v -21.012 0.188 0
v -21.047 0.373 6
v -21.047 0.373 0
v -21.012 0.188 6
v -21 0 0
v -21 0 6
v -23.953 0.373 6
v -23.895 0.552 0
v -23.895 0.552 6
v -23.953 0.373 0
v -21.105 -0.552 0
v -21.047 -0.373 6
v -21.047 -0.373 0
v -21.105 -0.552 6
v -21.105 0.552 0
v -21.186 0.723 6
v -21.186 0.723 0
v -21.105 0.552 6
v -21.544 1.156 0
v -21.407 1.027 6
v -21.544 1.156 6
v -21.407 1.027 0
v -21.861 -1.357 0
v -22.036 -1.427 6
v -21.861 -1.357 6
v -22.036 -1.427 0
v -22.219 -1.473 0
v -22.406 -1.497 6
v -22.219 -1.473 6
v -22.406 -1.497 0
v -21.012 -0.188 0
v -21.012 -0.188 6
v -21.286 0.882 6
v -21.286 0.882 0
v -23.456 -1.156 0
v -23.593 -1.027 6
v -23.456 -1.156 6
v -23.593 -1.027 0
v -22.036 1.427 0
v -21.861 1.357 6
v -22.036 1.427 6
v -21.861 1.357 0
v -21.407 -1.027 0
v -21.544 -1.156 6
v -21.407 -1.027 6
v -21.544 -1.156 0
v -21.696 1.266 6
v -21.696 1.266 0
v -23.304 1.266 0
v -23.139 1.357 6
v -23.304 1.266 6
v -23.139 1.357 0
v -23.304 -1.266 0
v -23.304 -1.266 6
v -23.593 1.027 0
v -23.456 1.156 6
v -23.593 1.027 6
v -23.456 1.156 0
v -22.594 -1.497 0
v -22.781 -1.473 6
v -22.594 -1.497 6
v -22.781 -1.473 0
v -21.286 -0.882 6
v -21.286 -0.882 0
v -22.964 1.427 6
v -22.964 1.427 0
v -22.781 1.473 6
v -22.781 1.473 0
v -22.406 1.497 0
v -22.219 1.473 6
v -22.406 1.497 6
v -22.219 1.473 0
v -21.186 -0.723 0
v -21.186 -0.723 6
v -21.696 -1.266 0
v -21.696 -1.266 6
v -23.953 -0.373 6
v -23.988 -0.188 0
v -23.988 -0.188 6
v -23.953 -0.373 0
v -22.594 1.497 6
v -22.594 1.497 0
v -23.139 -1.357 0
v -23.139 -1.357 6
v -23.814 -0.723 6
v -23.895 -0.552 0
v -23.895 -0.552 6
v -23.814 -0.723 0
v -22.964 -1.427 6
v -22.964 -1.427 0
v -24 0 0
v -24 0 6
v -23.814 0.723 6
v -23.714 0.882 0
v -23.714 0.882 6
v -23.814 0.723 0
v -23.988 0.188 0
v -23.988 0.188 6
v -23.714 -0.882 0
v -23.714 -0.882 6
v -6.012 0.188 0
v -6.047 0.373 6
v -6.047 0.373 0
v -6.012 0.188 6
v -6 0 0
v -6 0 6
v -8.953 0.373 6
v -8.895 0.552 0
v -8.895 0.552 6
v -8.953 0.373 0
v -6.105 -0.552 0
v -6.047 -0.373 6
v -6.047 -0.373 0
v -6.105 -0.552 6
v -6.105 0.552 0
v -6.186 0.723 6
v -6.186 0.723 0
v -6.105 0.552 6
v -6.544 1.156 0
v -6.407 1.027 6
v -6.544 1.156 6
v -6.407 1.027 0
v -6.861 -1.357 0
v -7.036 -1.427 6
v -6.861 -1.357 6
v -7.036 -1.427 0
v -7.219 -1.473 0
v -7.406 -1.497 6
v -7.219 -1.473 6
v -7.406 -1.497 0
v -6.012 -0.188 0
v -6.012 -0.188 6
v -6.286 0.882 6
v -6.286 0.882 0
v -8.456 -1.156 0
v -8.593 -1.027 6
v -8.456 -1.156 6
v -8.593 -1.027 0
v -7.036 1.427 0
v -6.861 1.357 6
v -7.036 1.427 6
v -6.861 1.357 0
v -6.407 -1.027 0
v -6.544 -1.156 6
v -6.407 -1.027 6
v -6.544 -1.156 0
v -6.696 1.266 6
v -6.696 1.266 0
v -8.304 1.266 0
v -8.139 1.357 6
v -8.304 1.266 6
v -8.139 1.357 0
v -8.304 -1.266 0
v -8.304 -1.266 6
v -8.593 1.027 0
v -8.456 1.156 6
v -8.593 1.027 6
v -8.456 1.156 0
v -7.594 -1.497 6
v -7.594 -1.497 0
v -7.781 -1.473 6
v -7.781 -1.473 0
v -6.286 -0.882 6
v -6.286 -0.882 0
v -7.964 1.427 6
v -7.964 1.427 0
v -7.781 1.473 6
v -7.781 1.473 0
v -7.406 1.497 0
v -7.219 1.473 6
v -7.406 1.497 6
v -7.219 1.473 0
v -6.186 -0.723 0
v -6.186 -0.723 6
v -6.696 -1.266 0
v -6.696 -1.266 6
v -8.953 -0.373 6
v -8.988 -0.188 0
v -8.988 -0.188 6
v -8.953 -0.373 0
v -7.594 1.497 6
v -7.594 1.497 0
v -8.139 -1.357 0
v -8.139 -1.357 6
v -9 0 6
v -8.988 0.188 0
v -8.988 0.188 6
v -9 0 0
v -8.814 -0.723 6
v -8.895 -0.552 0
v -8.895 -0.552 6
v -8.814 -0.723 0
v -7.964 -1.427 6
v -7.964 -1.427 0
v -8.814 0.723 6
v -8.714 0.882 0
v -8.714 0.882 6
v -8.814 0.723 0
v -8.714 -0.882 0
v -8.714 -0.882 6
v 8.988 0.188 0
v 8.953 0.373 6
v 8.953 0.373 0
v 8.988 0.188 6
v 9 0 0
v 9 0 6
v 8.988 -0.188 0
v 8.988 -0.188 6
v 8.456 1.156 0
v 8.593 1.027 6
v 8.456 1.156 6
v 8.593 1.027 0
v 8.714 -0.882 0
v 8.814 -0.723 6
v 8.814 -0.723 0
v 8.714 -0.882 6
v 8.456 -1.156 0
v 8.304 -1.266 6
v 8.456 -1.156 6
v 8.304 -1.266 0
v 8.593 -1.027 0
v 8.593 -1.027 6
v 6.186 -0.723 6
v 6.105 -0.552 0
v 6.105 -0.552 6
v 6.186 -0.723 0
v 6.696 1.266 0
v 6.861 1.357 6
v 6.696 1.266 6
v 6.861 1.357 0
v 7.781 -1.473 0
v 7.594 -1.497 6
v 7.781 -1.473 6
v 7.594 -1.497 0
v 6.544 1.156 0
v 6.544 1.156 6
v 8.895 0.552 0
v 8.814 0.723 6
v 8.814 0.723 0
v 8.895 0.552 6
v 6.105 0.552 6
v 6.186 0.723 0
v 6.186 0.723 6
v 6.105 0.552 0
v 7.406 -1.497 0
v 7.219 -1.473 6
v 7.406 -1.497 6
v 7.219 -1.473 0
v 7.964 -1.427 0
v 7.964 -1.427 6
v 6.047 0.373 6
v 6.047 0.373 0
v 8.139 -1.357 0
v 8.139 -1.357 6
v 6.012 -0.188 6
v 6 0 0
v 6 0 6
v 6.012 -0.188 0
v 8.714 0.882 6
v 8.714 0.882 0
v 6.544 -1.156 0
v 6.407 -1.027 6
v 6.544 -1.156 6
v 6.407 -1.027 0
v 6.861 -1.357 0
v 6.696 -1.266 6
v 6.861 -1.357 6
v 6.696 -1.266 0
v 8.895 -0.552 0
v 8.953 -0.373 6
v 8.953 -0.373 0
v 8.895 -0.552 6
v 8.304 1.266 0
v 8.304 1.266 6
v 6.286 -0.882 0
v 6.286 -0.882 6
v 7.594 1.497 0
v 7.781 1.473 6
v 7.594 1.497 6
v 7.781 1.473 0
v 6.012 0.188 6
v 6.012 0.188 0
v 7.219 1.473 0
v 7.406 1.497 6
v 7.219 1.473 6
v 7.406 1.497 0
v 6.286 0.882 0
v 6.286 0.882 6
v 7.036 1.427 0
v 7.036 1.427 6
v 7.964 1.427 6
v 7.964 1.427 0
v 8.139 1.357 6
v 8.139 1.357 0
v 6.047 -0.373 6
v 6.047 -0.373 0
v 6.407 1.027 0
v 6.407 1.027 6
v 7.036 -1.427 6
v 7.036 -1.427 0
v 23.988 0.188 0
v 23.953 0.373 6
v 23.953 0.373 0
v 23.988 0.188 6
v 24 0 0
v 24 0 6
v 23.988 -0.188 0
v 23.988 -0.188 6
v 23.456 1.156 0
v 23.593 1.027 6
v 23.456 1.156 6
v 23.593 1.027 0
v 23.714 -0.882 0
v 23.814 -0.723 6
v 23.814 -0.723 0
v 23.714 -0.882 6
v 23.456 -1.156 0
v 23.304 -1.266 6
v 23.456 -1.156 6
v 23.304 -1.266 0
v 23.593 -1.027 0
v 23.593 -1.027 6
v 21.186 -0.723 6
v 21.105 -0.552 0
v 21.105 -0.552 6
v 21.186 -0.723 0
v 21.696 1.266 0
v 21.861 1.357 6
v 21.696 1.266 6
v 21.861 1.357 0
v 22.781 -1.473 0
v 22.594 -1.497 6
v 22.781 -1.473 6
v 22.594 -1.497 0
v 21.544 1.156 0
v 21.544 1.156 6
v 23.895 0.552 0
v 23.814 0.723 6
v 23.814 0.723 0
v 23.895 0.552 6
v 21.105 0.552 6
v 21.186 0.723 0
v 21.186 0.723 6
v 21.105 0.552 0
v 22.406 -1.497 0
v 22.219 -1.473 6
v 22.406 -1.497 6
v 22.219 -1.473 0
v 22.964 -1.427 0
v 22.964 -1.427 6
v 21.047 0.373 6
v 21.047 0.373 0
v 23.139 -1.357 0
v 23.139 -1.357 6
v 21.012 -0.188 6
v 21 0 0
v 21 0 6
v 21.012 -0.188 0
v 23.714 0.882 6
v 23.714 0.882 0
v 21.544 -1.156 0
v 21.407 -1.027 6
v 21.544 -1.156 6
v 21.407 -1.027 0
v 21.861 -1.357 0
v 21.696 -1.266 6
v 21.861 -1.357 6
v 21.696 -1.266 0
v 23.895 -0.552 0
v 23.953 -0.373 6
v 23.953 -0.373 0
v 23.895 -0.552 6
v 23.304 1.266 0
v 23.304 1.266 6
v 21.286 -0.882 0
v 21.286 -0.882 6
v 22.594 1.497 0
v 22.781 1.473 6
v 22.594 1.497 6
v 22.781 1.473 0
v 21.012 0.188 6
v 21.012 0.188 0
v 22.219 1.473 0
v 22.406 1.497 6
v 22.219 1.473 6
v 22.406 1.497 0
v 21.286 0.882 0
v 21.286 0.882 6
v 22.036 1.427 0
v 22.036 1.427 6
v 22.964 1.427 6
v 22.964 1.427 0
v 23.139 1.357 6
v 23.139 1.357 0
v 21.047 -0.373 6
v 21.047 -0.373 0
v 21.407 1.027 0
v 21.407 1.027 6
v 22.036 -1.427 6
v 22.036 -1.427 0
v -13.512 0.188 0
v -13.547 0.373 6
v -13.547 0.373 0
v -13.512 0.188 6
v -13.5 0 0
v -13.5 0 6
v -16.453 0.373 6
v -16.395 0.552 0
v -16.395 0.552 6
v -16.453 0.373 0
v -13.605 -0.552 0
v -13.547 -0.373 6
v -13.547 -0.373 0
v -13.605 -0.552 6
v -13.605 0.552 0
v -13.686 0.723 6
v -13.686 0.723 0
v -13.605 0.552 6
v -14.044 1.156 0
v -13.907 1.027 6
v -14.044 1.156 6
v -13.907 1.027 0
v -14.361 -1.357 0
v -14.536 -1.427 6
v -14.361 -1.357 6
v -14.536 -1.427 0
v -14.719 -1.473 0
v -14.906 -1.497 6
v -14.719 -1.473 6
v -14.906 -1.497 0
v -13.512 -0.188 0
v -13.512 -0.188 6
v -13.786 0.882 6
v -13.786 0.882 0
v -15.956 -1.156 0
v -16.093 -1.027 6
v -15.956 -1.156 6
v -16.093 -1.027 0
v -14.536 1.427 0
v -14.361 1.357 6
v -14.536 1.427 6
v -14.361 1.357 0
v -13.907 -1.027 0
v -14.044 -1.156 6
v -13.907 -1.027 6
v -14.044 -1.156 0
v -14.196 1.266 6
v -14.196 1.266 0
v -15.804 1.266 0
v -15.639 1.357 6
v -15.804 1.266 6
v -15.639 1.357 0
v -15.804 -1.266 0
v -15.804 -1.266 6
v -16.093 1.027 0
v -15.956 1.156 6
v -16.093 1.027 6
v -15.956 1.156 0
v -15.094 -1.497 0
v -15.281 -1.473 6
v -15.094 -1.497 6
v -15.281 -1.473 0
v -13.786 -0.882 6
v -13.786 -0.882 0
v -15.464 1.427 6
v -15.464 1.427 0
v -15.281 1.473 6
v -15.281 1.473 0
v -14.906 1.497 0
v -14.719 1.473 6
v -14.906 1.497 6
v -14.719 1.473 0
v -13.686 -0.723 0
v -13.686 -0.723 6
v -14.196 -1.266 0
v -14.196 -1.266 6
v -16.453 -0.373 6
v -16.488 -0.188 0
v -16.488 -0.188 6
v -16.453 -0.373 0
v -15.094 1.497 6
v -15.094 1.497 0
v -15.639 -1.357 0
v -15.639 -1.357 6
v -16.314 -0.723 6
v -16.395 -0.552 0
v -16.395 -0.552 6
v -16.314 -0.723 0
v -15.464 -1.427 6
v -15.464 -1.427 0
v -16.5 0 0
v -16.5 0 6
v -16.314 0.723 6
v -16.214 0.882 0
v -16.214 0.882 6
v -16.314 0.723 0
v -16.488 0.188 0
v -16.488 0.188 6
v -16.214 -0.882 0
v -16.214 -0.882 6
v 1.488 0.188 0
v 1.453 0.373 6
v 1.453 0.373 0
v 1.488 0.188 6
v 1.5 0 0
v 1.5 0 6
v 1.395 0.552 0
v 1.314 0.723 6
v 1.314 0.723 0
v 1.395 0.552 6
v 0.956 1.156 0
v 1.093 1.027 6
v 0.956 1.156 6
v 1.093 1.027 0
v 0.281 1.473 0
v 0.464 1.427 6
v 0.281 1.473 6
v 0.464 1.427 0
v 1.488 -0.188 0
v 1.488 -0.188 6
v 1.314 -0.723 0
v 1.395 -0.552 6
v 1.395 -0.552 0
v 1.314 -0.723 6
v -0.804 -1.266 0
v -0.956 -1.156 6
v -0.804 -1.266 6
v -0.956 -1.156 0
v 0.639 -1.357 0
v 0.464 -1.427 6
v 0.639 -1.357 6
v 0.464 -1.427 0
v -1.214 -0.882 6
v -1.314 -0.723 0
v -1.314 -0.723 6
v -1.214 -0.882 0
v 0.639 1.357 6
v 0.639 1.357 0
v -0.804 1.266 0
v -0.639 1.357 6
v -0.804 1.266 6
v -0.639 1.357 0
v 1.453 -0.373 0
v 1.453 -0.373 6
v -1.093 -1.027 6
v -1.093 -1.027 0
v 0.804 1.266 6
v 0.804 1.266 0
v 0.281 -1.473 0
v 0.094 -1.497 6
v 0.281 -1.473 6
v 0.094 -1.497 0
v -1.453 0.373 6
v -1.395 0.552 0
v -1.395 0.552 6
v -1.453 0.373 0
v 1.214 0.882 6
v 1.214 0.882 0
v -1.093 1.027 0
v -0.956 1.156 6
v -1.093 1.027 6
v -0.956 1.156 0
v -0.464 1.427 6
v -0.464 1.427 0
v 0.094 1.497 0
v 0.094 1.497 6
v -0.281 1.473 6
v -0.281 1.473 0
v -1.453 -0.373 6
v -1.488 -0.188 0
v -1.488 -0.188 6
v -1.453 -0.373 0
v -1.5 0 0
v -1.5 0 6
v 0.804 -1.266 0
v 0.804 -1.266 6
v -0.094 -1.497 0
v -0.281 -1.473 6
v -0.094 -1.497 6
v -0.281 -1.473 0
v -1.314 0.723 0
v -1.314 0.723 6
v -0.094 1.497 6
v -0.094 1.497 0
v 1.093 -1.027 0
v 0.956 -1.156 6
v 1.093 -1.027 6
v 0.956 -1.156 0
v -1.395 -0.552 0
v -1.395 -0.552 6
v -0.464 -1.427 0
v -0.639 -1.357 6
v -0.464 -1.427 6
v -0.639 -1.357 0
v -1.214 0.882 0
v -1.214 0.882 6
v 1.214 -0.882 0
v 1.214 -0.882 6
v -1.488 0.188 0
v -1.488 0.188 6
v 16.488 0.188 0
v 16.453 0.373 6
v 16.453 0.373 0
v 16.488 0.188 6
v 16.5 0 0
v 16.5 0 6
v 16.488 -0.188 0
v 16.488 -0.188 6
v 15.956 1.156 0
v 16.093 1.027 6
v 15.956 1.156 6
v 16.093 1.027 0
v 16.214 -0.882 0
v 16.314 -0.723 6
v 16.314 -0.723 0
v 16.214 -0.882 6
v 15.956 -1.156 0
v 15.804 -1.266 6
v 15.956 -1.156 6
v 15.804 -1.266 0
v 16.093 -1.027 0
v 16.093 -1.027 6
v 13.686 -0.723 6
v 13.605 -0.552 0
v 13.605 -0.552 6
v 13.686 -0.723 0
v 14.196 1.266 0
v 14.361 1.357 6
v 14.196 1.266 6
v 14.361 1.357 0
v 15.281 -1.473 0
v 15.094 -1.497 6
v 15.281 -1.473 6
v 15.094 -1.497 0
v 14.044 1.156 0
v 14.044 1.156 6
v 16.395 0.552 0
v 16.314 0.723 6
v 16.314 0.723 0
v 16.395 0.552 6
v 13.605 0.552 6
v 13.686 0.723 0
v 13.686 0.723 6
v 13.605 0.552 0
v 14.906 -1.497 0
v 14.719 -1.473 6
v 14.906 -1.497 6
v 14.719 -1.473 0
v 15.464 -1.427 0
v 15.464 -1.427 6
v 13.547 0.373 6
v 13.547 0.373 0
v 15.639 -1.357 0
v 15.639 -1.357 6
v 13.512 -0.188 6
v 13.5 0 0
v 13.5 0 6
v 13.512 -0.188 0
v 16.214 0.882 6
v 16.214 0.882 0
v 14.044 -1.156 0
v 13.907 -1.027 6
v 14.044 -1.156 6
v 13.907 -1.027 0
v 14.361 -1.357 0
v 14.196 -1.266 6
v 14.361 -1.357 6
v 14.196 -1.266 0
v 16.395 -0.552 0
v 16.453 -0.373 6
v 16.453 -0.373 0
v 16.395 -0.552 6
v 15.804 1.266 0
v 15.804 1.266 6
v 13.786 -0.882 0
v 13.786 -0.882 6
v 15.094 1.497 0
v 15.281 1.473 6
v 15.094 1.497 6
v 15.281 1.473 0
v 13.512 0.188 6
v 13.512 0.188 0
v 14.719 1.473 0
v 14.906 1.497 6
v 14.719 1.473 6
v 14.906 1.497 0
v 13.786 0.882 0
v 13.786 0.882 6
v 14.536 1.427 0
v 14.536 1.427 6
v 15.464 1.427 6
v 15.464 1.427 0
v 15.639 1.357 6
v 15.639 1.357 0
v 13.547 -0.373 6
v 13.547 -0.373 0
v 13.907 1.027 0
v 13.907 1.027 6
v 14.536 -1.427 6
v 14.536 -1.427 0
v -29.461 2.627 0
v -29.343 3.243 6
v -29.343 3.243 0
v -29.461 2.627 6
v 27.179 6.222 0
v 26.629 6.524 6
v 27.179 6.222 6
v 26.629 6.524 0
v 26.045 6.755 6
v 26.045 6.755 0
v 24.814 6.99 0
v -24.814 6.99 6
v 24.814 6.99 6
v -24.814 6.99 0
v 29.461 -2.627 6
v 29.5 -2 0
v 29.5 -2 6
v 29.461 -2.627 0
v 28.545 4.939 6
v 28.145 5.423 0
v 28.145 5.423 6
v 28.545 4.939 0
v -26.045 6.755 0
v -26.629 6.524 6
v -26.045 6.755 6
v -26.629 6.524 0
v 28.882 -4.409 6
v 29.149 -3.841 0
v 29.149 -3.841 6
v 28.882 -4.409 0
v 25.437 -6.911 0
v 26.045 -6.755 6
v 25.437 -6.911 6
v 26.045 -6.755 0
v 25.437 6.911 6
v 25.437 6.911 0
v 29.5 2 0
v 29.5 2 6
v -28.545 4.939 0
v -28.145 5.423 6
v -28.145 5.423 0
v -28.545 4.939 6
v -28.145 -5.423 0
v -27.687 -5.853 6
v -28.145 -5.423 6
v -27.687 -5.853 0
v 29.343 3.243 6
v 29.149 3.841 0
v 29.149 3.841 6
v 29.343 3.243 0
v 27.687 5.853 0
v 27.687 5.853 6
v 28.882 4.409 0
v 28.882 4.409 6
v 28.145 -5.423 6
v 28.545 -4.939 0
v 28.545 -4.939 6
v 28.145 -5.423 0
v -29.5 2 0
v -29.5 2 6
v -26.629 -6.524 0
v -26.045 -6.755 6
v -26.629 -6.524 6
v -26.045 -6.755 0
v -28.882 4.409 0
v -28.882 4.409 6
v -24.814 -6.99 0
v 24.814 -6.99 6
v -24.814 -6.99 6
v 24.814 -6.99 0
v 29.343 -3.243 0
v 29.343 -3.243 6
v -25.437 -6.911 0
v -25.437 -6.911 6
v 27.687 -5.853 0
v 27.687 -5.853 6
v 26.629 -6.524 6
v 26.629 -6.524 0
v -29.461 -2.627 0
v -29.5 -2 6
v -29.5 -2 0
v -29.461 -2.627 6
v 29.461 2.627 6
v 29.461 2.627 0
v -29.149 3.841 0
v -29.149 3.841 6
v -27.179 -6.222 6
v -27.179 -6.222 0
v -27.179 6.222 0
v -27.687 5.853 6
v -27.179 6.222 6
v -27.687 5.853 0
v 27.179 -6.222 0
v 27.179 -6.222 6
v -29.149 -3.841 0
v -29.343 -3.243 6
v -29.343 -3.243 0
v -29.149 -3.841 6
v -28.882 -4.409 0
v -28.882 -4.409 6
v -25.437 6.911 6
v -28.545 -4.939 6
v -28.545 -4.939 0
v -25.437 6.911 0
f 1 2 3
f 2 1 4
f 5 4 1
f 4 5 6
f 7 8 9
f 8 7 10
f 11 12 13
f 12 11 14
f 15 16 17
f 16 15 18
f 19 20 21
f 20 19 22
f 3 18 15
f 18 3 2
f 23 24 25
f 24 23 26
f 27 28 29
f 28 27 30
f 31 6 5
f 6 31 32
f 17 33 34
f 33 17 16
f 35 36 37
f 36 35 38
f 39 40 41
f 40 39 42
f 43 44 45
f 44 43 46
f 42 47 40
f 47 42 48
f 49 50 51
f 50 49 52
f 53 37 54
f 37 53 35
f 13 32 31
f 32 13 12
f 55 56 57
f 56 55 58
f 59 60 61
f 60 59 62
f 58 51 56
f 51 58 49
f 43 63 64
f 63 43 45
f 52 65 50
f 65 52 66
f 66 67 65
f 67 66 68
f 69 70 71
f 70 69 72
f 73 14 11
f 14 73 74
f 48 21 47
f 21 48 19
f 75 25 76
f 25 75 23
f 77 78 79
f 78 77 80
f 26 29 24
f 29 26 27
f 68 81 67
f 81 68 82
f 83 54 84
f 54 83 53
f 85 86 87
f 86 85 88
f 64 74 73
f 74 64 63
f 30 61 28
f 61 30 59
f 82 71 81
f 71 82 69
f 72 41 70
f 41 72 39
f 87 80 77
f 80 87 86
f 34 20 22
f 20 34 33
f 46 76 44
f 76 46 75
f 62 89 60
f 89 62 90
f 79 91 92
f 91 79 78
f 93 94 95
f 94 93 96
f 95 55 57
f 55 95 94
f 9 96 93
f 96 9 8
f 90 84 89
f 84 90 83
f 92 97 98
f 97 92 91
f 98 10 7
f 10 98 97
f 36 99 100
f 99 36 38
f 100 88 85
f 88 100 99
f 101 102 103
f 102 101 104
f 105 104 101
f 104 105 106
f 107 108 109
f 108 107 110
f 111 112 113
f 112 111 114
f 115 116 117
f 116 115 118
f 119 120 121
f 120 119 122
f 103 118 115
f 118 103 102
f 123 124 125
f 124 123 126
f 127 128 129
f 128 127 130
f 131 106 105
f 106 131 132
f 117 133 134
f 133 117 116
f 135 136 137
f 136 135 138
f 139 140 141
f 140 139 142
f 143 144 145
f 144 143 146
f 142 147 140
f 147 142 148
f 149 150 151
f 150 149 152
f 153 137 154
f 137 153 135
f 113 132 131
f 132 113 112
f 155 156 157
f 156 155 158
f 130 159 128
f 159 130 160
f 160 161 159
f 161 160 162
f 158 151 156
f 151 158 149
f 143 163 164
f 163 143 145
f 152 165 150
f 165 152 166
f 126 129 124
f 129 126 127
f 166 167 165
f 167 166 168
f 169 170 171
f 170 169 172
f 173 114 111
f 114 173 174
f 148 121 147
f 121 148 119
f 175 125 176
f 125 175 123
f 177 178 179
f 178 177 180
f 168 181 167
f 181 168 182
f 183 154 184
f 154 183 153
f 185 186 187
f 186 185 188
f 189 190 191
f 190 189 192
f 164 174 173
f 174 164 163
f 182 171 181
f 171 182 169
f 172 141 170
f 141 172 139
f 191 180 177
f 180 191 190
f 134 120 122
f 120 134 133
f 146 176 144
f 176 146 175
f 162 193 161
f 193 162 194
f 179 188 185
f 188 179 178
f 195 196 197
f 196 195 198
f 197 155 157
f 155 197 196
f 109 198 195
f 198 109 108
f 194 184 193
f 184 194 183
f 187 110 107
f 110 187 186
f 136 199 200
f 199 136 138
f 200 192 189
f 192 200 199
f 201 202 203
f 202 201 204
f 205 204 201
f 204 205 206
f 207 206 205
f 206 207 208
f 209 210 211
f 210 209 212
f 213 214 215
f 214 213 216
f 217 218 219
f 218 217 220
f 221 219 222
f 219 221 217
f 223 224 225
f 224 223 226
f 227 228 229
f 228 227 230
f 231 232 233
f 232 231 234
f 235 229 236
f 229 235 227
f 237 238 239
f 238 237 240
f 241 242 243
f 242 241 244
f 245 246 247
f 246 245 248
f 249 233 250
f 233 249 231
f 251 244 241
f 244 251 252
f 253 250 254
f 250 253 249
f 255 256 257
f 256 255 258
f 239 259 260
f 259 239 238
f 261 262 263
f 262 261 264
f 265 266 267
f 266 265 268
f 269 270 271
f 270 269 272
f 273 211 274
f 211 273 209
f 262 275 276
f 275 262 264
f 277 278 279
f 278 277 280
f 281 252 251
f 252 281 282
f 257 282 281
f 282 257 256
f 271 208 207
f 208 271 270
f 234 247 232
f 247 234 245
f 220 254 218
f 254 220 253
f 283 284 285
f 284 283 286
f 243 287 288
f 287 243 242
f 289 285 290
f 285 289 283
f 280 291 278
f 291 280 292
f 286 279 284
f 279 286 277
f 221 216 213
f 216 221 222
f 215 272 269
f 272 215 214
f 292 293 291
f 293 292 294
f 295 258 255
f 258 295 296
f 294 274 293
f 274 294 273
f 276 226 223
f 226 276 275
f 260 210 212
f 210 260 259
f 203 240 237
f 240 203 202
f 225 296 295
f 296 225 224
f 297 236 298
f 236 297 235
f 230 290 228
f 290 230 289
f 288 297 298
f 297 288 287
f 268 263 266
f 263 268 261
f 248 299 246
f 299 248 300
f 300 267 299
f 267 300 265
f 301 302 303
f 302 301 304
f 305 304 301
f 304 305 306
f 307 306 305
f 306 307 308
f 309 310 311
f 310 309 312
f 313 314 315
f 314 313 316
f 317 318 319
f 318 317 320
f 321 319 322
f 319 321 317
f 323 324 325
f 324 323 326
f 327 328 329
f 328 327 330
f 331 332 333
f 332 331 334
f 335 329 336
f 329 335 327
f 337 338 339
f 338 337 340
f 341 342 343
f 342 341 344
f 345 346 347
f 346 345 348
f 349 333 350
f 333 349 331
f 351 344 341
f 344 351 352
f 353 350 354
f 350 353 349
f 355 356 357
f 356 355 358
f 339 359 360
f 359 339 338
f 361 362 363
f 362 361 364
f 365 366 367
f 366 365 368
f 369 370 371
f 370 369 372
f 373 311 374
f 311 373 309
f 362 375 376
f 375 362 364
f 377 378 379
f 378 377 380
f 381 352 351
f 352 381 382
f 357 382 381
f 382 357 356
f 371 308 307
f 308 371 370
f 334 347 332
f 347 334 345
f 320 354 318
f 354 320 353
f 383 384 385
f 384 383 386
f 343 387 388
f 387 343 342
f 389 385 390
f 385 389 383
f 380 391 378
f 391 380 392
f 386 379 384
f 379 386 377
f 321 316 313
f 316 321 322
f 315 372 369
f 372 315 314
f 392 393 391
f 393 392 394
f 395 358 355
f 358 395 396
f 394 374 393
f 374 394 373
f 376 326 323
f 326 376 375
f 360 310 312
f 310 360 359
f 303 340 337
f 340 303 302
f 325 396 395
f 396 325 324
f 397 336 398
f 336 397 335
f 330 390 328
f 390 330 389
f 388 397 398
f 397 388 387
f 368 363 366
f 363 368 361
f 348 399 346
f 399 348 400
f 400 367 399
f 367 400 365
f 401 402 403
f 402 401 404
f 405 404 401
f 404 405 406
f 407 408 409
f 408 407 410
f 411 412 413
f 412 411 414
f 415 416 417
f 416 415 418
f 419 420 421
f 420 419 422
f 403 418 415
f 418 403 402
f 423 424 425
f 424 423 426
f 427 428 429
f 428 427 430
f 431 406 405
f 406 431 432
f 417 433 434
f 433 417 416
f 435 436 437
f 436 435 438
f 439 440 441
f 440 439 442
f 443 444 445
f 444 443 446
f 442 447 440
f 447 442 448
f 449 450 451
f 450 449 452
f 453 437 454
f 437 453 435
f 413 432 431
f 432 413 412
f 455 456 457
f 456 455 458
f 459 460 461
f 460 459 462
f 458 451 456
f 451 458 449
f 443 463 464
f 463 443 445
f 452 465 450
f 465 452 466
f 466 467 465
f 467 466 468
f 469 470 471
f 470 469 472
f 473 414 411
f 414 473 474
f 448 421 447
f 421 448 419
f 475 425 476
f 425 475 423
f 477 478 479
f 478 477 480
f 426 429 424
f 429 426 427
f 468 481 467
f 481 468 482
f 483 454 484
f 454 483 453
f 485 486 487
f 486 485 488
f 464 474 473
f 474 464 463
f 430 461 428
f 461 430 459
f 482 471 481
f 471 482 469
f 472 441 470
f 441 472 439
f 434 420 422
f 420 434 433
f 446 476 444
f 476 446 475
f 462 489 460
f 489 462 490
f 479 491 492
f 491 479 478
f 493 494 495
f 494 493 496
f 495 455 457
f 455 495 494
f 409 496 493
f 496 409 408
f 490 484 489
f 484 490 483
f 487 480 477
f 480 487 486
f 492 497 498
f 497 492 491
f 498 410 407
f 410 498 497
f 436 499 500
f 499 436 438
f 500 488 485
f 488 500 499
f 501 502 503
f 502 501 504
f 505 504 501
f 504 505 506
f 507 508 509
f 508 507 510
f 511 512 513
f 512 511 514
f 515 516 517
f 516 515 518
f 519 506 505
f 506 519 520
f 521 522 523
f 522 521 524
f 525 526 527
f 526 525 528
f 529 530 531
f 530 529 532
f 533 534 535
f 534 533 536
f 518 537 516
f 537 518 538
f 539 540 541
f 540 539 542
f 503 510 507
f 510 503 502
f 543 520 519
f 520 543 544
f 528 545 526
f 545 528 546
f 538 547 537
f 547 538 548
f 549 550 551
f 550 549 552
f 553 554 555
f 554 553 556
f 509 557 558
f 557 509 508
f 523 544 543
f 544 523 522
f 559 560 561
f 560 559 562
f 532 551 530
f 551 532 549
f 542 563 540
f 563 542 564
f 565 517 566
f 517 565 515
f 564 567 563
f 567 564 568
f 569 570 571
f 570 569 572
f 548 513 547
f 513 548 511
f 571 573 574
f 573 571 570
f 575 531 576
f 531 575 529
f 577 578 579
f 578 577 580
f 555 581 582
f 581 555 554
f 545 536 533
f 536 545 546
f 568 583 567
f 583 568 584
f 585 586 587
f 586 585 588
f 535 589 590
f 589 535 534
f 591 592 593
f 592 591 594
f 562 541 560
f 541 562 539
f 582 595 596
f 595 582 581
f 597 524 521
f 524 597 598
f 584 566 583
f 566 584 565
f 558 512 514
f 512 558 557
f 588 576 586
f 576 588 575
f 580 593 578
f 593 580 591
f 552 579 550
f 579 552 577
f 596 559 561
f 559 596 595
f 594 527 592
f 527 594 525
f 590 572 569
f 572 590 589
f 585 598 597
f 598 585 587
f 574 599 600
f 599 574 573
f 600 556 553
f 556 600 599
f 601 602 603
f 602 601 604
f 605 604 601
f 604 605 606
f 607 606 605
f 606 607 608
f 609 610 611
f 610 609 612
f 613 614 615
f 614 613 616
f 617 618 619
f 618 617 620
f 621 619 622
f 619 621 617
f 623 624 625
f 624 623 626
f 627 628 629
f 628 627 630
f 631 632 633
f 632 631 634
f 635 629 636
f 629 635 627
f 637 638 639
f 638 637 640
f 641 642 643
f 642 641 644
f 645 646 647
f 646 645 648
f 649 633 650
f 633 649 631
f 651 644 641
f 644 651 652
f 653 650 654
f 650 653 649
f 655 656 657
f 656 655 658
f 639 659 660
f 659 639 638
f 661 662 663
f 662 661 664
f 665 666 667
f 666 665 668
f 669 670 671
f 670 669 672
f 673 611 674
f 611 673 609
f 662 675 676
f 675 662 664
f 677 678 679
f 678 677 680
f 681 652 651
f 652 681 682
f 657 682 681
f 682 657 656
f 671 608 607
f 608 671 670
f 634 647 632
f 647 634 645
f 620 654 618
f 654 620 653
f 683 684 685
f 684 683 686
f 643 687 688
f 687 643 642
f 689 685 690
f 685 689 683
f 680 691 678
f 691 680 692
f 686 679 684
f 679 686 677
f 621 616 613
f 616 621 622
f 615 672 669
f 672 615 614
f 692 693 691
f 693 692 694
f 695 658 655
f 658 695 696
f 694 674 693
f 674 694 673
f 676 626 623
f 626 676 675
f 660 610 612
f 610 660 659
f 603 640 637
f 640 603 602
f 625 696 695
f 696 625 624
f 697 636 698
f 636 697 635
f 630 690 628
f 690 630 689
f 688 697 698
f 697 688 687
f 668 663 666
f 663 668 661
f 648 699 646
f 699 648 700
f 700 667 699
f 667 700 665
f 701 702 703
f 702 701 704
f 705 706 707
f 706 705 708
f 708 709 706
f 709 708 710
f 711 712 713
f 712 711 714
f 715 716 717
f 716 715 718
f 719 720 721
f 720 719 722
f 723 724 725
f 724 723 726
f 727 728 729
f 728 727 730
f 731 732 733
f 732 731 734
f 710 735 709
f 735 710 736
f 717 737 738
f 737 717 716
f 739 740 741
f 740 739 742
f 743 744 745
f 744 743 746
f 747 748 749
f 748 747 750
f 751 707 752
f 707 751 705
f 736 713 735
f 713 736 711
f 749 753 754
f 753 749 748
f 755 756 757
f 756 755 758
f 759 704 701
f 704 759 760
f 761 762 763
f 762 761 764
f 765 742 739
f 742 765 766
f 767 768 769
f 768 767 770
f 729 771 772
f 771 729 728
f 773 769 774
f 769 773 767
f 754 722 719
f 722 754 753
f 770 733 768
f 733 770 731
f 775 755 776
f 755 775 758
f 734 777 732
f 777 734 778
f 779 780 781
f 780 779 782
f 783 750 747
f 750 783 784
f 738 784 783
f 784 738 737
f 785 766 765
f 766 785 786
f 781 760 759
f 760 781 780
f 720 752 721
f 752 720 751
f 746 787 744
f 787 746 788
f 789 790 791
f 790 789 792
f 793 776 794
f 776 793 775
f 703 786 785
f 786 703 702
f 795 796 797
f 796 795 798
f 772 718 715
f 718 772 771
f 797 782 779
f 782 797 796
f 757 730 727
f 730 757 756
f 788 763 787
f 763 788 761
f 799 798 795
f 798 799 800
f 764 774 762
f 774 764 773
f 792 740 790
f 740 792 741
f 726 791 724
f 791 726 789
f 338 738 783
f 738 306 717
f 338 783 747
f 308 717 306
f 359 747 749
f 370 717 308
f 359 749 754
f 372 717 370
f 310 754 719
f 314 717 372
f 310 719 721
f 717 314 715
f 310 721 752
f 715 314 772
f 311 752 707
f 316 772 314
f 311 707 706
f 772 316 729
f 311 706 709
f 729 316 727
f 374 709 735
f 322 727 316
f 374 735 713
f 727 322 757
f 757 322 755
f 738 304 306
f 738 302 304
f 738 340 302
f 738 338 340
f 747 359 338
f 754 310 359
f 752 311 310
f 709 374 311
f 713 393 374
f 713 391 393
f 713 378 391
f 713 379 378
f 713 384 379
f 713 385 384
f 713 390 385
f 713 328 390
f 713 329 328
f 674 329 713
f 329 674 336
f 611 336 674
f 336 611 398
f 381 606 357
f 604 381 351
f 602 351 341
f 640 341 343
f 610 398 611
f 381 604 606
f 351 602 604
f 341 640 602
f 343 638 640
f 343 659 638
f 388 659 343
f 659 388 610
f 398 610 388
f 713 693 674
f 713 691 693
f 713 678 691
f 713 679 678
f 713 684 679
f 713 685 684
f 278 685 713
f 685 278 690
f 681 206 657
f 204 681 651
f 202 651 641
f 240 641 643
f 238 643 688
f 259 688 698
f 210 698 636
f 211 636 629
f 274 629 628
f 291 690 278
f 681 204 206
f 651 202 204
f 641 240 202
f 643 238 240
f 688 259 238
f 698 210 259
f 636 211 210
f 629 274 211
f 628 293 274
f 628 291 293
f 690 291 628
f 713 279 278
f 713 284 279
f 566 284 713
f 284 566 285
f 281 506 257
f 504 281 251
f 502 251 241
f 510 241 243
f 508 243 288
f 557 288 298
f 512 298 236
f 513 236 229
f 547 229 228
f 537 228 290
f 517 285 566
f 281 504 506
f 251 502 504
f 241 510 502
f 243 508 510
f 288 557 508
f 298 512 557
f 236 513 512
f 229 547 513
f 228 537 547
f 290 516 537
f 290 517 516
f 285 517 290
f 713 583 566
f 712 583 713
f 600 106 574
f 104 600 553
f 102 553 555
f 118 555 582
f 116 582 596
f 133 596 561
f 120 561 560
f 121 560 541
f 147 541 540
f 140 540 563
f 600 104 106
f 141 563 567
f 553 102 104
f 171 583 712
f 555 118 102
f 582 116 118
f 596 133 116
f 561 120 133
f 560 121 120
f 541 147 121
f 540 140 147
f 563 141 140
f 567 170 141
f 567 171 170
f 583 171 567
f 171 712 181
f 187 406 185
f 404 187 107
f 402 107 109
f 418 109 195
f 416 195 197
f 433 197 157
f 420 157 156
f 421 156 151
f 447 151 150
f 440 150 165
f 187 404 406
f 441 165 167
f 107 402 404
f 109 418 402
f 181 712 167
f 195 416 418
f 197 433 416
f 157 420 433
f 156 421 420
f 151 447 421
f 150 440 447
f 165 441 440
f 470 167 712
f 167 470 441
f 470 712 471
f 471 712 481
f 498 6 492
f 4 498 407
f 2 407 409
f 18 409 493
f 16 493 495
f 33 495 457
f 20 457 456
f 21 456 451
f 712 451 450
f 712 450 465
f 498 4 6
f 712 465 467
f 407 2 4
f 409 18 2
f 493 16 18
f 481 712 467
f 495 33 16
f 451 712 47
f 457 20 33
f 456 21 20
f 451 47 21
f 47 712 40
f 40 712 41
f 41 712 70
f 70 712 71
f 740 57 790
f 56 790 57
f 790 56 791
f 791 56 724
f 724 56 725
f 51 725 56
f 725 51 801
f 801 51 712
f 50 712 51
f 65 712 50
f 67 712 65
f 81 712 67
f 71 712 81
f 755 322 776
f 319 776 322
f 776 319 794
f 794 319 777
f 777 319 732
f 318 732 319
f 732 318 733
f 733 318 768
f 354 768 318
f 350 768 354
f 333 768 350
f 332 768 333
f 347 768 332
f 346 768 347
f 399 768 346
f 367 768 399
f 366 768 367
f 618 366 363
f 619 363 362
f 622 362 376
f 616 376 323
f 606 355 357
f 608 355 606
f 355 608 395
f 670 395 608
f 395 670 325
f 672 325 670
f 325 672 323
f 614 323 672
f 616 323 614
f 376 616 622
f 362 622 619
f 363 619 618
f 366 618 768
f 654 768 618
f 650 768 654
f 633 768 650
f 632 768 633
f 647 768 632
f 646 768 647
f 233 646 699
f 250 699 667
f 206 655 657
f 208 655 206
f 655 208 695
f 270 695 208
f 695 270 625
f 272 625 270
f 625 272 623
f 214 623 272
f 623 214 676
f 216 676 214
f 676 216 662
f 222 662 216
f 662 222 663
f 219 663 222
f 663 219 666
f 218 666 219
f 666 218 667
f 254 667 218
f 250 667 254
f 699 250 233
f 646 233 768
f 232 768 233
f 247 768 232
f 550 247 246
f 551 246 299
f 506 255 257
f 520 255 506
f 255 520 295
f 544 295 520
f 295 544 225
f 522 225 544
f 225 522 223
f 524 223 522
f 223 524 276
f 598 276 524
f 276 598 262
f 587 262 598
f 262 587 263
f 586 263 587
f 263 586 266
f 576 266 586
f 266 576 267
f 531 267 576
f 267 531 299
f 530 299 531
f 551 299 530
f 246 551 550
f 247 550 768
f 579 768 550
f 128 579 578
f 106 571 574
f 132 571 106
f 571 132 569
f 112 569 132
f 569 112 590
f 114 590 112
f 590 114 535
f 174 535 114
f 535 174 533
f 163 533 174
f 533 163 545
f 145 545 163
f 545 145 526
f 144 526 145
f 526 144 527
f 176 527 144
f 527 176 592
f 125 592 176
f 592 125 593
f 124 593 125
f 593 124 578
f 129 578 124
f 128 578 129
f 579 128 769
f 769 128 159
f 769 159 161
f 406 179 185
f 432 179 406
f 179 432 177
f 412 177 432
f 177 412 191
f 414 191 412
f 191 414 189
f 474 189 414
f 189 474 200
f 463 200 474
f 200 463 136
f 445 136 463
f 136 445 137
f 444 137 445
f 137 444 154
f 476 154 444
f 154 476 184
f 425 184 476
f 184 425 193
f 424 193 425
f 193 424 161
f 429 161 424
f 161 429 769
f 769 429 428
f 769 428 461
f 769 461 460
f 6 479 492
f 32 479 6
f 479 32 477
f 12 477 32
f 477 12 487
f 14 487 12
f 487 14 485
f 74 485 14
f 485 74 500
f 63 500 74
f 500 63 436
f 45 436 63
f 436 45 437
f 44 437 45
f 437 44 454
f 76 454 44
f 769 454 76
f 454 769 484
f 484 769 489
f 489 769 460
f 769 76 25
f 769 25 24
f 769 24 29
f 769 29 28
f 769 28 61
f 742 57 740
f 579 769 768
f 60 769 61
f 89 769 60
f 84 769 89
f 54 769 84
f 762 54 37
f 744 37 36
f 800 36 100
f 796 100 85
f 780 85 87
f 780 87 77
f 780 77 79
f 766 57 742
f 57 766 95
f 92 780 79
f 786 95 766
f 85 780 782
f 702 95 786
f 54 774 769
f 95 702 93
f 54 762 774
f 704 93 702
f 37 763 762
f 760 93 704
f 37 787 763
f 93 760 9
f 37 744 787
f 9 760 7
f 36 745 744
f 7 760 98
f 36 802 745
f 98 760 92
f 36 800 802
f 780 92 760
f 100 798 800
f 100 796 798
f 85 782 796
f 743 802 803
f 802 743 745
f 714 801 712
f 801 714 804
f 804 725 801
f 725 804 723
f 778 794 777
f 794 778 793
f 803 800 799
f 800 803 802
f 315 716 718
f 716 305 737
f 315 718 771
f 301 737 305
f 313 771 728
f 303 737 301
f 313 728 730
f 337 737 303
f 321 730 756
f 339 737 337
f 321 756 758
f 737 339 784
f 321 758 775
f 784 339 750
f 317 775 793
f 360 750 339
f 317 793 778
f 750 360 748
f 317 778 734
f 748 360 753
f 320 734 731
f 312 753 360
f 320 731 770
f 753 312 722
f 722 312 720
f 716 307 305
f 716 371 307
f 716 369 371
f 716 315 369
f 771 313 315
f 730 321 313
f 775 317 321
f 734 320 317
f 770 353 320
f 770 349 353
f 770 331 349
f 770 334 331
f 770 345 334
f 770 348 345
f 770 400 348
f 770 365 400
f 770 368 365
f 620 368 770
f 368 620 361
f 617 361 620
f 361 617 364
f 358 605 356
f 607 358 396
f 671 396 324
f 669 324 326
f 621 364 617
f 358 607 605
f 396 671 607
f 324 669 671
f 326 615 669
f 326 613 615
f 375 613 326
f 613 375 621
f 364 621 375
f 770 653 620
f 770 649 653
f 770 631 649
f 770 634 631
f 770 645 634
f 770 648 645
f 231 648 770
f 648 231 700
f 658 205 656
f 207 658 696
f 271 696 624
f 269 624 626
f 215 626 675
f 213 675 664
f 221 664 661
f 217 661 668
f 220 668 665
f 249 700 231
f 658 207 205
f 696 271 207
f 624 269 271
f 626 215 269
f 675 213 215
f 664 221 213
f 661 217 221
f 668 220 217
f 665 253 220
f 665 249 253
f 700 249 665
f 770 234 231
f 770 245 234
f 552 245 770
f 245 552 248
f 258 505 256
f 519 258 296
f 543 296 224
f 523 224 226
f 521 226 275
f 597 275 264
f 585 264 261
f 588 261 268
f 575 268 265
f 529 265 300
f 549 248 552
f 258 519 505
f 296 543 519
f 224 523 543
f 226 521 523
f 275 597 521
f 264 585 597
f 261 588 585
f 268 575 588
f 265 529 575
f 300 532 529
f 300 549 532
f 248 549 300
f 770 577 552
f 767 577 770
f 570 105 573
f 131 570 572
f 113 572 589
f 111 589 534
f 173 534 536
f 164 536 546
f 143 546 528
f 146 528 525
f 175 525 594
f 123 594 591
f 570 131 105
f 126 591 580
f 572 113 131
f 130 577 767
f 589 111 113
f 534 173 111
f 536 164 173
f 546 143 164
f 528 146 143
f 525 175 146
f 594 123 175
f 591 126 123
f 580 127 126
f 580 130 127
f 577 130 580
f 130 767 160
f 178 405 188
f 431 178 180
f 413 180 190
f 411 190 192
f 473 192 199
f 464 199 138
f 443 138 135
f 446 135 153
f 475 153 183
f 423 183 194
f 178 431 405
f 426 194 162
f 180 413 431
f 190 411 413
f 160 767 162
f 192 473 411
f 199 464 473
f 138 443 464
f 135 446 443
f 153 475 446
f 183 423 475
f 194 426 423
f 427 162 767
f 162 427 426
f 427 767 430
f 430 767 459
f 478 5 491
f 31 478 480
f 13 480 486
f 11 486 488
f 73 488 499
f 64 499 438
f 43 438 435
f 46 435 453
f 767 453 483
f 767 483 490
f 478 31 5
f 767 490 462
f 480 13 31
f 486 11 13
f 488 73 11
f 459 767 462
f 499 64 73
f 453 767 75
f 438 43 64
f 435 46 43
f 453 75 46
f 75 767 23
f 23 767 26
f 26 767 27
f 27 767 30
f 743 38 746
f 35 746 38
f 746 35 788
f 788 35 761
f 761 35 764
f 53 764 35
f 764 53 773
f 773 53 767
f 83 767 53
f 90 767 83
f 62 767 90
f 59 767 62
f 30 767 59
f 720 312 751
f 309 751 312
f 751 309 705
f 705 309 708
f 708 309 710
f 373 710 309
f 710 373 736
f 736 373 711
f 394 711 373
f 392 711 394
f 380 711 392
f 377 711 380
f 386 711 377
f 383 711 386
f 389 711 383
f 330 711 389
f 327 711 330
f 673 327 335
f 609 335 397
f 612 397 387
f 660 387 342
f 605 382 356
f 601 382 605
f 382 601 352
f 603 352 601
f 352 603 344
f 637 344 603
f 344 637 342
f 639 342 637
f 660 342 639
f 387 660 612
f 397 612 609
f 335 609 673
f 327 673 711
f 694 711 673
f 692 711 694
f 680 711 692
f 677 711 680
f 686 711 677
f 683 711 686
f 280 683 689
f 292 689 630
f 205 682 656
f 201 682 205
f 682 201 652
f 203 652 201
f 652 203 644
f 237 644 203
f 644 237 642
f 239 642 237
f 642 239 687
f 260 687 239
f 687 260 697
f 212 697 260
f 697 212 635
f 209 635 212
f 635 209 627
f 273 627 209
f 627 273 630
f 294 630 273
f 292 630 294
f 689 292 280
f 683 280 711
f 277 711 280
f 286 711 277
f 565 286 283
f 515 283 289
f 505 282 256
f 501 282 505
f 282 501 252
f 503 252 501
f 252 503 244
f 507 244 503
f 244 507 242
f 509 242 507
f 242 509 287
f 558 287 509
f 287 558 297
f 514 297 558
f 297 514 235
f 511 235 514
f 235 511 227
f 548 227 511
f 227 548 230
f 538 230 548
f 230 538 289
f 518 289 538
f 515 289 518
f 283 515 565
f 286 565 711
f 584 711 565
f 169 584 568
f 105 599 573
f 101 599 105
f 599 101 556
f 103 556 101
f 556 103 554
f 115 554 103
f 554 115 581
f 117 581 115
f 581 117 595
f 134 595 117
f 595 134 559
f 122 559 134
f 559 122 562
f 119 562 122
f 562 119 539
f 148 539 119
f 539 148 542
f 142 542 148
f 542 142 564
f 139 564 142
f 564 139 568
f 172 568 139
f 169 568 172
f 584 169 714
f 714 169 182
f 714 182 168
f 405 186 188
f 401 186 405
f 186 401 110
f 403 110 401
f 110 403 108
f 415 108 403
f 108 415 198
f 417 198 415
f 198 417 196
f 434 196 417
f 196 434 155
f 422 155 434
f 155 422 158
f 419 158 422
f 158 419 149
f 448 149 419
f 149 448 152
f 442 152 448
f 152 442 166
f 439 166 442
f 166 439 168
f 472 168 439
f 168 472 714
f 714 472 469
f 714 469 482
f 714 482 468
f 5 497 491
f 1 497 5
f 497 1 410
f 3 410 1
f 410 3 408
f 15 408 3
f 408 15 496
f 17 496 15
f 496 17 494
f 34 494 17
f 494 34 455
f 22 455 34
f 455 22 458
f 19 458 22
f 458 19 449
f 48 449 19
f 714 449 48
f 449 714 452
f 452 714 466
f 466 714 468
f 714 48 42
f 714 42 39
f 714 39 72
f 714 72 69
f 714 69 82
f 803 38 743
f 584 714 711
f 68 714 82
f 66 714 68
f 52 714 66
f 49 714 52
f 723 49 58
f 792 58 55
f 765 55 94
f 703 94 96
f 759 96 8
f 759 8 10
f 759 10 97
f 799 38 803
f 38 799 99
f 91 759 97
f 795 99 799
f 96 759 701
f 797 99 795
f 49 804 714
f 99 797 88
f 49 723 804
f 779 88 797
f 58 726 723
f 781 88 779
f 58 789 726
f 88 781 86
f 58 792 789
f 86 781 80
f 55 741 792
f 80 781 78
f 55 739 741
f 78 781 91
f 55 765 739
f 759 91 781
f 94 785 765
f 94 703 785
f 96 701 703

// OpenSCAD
$fn = 50;


difference() {
	union() {
		hull() {
			translate(v = [-24.5000000000, 2.0000000000, 0]) {
				cylinder(h = 6, r = 5);
			}
			translate(v = [24.5000000000, 2.0000000000, 0]) {
				cylinder(h = 6, r = 5);
			}
			translate(v = [-24.5000000000, -2.0000000000, 0]) {
				cylinder(h = 6, r = 5);
			}
			translate(v = [24.5000000000, -2.0000000000, 0]) {
				cylinder(h = 6, r = 5);
			}
		}
	}
	union() {
		translate(v = [-22.5000000000, 0.0000000000, 0]) {
			translate(v = [0, 0, -100]) {
				cylinder(h = 200, r = 1.5000000000);
			}
		}
		translate(v = [-7.5000000000, 0.0000000000, 0]) {
			translate(v = [0, 0, -100]) {
				cylinder(h = 200, r = 1.5000000000);
			}
		}
		translate(v = [7.5000000000, 0.0000000000, 0]) {
			translate(v = [0, 0, -100]) {
				cylinder(h = 200, r = 1.5000000000);
			}
		}
		translate(v = [22.5000000000, 0.0000000000, 0]) {
			translate(v = [0, 0, -100]) {
				cylinder(h = 200, r = 1.5000000000);
			}
		}
		translate(v = [-22.5000000000, 0.0000000000, 0]) {
			translate(v = [0, 0, -100]) {
				cylinder(h = 200, r = 1.5000000000);
			}
		}
		translate(v = [-15.0000000000, 0.0000000000, 0]) {
			translate(v = [0, 0, -100]) {
				cylinder(h = 200, r = 1.5000000000);
			}
		}
		translate(v = [-7.5000000000, 0.0000000000, 0]) {
			translate(v = [0, 0, -100]) {
				cylinder(h = 200, r = 1.5000000000);
			}
		}
		translate(v = [0, 0, -100]) {
			cylinder(h = 200, r = 1.5000000000);
		}
		translate(v = [7.5000000000, 0.0000000000, 0]) {
			translate(v = [0, 0, -100]) {
				cylinder(h = 200, r = 1.5000000000);
			}
		}
		translate(v = [15.0000000000, 0.0000000000, 0]) {
			translate(v = [0, 0, -100]) {
				cylinder(h = 200, r = 1.5000000000);
			}
		}
		translate(v = [22.5000000000, 0.0000000000, 0]) {
			translate(v = [0, 0, -100]) {
				cylinder(h = 200, r = 1.5000000000);
			}
		}
	}
}
